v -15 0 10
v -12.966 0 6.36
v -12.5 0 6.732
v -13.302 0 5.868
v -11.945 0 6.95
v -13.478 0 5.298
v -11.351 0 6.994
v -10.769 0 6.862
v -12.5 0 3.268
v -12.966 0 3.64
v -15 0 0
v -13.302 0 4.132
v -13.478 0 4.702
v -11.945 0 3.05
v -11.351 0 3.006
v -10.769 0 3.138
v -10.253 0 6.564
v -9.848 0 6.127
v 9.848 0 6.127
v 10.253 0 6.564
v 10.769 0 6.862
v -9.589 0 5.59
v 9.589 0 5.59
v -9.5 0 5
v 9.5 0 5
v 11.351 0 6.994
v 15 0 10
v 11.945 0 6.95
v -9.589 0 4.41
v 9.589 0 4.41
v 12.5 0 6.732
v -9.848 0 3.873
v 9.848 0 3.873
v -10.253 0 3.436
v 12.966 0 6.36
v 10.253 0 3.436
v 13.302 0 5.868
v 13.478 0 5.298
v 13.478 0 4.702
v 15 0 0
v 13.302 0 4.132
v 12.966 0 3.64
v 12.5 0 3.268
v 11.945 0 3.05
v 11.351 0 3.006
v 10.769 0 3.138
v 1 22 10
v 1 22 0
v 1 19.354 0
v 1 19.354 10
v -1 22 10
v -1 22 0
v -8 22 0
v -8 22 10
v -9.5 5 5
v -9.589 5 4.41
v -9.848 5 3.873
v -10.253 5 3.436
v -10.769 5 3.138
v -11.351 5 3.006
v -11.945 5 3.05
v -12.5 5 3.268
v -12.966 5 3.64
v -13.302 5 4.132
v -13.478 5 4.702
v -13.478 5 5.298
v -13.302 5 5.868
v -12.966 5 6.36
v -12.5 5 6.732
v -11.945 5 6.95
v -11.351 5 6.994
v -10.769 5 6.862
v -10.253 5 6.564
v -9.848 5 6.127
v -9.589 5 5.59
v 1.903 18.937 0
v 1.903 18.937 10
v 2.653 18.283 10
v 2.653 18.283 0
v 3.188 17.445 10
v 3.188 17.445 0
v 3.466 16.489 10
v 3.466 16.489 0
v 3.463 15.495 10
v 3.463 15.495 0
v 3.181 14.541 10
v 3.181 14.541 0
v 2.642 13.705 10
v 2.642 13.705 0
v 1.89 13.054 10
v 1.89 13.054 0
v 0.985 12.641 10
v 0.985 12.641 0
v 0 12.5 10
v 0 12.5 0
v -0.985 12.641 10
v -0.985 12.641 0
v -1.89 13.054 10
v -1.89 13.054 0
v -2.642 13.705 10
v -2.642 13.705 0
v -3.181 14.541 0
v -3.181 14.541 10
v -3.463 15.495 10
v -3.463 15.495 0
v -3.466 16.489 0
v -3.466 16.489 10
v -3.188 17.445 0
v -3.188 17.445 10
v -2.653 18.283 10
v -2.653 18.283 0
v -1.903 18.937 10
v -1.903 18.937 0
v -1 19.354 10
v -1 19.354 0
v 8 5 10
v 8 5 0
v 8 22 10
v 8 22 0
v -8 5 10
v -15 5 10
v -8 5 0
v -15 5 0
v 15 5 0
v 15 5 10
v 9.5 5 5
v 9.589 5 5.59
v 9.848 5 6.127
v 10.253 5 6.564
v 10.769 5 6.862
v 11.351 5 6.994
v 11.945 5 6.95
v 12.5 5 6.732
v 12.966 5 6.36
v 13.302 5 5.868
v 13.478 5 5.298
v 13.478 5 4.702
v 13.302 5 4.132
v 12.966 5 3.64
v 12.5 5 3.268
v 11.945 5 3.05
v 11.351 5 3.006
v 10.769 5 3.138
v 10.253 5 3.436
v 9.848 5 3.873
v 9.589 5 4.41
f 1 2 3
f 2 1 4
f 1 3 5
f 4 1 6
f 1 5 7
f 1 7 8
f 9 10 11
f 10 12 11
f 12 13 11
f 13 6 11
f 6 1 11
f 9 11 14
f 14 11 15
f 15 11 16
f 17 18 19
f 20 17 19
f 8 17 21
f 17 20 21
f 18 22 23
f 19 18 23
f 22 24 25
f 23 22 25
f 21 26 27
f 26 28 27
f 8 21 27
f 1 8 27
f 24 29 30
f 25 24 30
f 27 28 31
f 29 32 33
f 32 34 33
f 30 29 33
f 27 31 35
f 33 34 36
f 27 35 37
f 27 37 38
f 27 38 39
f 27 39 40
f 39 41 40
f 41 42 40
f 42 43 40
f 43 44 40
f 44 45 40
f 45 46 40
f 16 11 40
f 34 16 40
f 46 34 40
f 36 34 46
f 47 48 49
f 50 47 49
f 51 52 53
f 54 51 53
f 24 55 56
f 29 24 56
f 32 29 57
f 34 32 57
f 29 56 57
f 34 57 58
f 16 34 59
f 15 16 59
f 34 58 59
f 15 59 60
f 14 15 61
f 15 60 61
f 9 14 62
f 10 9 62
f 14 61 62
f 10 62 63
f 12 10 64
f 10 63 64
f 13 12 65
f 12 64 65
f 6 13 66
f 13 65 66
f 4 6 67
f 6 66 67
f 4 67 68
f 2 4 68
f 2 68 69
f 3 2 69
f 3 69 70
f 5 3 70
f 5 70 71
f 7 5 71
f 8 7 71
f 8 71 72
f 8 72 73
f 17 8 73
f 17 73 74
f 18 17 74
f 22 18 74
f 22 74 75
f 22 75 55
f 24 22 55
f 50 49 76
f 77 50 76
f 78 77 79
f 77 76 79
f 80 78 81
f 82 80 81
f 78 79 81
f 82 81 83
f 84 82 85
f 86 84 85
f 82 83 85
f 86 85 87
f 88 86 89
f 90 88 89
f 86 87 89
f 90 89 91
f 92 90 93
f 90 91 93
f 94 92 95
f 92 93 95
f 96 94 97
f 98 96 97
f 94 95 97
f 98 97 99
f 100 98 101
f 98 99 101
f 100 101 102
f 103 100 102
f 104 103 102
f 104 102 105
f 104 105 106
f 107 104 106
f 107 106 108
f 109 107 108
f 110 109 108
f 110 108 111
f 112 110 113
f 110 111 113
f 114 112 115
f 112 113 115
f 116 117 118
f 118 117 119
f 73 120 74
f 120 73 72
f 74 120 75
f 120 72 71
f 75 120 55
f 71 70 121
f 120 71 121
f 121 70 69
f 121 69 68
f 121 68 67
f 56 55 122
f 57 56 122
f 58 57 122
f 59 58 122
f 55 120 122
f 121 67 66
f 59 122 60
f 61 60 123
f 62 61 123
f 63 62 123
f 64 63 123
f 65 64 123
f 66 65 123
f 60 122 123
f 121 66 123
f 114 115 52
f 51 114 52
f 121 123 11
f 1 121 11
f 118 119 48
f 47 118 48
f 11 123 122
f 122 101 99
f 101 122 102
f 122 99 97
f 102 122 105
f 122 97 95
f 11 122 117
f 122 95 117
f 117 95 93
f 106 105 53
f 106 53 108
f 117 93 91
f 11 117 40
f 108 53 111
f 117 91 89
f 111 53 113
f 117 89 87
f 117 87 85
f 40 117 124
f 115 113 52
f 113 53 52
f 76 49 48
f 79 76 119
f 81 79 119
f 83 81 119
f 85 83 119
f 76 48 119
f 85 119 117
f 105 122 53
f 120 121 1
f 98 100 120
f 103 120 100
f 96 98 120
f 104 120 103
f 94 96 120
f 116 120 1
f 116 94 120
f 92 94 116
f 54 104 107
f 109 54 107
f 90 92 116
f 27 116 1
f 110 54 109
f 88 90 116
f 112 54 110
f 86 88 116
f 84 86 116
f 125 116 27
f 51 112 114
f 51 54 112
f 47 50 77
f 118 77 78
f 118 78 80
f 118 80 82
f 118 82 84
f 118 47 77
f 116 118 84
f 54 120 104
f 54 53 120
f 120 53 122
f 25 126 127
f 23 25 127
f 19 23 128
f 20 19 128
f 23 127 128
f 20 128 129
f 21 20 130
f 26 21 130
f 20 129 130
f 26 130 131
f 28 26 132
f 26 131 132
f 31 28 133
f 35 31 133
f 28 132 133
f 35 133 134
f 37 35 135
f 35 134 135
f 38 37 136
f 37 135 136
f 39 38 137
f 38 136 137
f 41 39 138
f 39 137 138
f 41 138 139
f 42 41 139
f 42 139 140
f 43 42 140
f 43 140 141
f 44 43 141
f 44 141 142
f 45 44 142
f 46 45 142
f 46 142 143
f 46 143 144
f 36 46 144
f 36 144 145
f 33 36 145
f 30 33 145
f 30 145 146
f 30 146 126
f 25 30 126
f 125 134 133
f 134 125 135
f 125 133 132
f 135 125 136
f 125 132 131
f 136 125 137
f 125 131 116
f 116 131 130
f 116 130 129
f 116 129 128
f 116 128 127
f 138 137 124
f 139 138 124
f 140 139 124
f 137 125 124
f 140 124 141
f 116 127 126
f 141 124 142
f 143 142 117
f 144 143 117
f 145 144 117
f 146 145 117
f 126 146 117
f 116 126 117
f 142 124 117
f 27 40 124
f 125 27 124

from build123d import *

# Parameters (mm, degrees)
BOSS_EXTRU_1_DEPTH      = 10
ESQUISSE4_R             = 2
ENL_V_MAT_EXTRU_1_DEPTH = 25.779023387


with BuildPart() as part:
    # Esquisse3 → Boss.-Extru.1 (new body)
    with BuildSketch(Plane.XY):
        with BuildLine():
            Line((-15, 0), (15, 0))
            Line((15, 0), (15, 5))
            Line((15, 5), (8, 5))
            Line((8, 5), (8, 22))
            Line((8, 22), (1, 22))
            Line((1, 22), (1, 19.354101966))
            ThreePointArc((1, 19.354101966), (0, 12.5), (-1, 19.354101966))
            Line((-1, 19.354101966), (-1, 22))
            Line((-1, 22), (-8, 22))
            Line((-8, 22), (-8, 5))
            Line((-8, 5), (-15, 5))
            Line((-15, 5), (-15, 0))
        make_face()
    extrude(amount=BOSS_EXTRU_1_DEPTH)

    # Esquisse4 → Enlèv. mat.-Extru.1 (cut, through all)
    with BuildSketch(Plane(origin=(0, 5, 0), x_dir=(1, 0, 0), z_dir=(0, 1, 0))):
        with Locations(Location((11.5, -5, 0), (0, 0, 180))):
            Circle(ESQUISSE4_R)
        with Locations((-11.5, -5)):
            Circle(ESQUISSE4_R)
    extrude(amount=-ENL_V_MAT_EXTRU_1_DEPTH, mode=Mode.SUBTRACT)


solid = part.part
